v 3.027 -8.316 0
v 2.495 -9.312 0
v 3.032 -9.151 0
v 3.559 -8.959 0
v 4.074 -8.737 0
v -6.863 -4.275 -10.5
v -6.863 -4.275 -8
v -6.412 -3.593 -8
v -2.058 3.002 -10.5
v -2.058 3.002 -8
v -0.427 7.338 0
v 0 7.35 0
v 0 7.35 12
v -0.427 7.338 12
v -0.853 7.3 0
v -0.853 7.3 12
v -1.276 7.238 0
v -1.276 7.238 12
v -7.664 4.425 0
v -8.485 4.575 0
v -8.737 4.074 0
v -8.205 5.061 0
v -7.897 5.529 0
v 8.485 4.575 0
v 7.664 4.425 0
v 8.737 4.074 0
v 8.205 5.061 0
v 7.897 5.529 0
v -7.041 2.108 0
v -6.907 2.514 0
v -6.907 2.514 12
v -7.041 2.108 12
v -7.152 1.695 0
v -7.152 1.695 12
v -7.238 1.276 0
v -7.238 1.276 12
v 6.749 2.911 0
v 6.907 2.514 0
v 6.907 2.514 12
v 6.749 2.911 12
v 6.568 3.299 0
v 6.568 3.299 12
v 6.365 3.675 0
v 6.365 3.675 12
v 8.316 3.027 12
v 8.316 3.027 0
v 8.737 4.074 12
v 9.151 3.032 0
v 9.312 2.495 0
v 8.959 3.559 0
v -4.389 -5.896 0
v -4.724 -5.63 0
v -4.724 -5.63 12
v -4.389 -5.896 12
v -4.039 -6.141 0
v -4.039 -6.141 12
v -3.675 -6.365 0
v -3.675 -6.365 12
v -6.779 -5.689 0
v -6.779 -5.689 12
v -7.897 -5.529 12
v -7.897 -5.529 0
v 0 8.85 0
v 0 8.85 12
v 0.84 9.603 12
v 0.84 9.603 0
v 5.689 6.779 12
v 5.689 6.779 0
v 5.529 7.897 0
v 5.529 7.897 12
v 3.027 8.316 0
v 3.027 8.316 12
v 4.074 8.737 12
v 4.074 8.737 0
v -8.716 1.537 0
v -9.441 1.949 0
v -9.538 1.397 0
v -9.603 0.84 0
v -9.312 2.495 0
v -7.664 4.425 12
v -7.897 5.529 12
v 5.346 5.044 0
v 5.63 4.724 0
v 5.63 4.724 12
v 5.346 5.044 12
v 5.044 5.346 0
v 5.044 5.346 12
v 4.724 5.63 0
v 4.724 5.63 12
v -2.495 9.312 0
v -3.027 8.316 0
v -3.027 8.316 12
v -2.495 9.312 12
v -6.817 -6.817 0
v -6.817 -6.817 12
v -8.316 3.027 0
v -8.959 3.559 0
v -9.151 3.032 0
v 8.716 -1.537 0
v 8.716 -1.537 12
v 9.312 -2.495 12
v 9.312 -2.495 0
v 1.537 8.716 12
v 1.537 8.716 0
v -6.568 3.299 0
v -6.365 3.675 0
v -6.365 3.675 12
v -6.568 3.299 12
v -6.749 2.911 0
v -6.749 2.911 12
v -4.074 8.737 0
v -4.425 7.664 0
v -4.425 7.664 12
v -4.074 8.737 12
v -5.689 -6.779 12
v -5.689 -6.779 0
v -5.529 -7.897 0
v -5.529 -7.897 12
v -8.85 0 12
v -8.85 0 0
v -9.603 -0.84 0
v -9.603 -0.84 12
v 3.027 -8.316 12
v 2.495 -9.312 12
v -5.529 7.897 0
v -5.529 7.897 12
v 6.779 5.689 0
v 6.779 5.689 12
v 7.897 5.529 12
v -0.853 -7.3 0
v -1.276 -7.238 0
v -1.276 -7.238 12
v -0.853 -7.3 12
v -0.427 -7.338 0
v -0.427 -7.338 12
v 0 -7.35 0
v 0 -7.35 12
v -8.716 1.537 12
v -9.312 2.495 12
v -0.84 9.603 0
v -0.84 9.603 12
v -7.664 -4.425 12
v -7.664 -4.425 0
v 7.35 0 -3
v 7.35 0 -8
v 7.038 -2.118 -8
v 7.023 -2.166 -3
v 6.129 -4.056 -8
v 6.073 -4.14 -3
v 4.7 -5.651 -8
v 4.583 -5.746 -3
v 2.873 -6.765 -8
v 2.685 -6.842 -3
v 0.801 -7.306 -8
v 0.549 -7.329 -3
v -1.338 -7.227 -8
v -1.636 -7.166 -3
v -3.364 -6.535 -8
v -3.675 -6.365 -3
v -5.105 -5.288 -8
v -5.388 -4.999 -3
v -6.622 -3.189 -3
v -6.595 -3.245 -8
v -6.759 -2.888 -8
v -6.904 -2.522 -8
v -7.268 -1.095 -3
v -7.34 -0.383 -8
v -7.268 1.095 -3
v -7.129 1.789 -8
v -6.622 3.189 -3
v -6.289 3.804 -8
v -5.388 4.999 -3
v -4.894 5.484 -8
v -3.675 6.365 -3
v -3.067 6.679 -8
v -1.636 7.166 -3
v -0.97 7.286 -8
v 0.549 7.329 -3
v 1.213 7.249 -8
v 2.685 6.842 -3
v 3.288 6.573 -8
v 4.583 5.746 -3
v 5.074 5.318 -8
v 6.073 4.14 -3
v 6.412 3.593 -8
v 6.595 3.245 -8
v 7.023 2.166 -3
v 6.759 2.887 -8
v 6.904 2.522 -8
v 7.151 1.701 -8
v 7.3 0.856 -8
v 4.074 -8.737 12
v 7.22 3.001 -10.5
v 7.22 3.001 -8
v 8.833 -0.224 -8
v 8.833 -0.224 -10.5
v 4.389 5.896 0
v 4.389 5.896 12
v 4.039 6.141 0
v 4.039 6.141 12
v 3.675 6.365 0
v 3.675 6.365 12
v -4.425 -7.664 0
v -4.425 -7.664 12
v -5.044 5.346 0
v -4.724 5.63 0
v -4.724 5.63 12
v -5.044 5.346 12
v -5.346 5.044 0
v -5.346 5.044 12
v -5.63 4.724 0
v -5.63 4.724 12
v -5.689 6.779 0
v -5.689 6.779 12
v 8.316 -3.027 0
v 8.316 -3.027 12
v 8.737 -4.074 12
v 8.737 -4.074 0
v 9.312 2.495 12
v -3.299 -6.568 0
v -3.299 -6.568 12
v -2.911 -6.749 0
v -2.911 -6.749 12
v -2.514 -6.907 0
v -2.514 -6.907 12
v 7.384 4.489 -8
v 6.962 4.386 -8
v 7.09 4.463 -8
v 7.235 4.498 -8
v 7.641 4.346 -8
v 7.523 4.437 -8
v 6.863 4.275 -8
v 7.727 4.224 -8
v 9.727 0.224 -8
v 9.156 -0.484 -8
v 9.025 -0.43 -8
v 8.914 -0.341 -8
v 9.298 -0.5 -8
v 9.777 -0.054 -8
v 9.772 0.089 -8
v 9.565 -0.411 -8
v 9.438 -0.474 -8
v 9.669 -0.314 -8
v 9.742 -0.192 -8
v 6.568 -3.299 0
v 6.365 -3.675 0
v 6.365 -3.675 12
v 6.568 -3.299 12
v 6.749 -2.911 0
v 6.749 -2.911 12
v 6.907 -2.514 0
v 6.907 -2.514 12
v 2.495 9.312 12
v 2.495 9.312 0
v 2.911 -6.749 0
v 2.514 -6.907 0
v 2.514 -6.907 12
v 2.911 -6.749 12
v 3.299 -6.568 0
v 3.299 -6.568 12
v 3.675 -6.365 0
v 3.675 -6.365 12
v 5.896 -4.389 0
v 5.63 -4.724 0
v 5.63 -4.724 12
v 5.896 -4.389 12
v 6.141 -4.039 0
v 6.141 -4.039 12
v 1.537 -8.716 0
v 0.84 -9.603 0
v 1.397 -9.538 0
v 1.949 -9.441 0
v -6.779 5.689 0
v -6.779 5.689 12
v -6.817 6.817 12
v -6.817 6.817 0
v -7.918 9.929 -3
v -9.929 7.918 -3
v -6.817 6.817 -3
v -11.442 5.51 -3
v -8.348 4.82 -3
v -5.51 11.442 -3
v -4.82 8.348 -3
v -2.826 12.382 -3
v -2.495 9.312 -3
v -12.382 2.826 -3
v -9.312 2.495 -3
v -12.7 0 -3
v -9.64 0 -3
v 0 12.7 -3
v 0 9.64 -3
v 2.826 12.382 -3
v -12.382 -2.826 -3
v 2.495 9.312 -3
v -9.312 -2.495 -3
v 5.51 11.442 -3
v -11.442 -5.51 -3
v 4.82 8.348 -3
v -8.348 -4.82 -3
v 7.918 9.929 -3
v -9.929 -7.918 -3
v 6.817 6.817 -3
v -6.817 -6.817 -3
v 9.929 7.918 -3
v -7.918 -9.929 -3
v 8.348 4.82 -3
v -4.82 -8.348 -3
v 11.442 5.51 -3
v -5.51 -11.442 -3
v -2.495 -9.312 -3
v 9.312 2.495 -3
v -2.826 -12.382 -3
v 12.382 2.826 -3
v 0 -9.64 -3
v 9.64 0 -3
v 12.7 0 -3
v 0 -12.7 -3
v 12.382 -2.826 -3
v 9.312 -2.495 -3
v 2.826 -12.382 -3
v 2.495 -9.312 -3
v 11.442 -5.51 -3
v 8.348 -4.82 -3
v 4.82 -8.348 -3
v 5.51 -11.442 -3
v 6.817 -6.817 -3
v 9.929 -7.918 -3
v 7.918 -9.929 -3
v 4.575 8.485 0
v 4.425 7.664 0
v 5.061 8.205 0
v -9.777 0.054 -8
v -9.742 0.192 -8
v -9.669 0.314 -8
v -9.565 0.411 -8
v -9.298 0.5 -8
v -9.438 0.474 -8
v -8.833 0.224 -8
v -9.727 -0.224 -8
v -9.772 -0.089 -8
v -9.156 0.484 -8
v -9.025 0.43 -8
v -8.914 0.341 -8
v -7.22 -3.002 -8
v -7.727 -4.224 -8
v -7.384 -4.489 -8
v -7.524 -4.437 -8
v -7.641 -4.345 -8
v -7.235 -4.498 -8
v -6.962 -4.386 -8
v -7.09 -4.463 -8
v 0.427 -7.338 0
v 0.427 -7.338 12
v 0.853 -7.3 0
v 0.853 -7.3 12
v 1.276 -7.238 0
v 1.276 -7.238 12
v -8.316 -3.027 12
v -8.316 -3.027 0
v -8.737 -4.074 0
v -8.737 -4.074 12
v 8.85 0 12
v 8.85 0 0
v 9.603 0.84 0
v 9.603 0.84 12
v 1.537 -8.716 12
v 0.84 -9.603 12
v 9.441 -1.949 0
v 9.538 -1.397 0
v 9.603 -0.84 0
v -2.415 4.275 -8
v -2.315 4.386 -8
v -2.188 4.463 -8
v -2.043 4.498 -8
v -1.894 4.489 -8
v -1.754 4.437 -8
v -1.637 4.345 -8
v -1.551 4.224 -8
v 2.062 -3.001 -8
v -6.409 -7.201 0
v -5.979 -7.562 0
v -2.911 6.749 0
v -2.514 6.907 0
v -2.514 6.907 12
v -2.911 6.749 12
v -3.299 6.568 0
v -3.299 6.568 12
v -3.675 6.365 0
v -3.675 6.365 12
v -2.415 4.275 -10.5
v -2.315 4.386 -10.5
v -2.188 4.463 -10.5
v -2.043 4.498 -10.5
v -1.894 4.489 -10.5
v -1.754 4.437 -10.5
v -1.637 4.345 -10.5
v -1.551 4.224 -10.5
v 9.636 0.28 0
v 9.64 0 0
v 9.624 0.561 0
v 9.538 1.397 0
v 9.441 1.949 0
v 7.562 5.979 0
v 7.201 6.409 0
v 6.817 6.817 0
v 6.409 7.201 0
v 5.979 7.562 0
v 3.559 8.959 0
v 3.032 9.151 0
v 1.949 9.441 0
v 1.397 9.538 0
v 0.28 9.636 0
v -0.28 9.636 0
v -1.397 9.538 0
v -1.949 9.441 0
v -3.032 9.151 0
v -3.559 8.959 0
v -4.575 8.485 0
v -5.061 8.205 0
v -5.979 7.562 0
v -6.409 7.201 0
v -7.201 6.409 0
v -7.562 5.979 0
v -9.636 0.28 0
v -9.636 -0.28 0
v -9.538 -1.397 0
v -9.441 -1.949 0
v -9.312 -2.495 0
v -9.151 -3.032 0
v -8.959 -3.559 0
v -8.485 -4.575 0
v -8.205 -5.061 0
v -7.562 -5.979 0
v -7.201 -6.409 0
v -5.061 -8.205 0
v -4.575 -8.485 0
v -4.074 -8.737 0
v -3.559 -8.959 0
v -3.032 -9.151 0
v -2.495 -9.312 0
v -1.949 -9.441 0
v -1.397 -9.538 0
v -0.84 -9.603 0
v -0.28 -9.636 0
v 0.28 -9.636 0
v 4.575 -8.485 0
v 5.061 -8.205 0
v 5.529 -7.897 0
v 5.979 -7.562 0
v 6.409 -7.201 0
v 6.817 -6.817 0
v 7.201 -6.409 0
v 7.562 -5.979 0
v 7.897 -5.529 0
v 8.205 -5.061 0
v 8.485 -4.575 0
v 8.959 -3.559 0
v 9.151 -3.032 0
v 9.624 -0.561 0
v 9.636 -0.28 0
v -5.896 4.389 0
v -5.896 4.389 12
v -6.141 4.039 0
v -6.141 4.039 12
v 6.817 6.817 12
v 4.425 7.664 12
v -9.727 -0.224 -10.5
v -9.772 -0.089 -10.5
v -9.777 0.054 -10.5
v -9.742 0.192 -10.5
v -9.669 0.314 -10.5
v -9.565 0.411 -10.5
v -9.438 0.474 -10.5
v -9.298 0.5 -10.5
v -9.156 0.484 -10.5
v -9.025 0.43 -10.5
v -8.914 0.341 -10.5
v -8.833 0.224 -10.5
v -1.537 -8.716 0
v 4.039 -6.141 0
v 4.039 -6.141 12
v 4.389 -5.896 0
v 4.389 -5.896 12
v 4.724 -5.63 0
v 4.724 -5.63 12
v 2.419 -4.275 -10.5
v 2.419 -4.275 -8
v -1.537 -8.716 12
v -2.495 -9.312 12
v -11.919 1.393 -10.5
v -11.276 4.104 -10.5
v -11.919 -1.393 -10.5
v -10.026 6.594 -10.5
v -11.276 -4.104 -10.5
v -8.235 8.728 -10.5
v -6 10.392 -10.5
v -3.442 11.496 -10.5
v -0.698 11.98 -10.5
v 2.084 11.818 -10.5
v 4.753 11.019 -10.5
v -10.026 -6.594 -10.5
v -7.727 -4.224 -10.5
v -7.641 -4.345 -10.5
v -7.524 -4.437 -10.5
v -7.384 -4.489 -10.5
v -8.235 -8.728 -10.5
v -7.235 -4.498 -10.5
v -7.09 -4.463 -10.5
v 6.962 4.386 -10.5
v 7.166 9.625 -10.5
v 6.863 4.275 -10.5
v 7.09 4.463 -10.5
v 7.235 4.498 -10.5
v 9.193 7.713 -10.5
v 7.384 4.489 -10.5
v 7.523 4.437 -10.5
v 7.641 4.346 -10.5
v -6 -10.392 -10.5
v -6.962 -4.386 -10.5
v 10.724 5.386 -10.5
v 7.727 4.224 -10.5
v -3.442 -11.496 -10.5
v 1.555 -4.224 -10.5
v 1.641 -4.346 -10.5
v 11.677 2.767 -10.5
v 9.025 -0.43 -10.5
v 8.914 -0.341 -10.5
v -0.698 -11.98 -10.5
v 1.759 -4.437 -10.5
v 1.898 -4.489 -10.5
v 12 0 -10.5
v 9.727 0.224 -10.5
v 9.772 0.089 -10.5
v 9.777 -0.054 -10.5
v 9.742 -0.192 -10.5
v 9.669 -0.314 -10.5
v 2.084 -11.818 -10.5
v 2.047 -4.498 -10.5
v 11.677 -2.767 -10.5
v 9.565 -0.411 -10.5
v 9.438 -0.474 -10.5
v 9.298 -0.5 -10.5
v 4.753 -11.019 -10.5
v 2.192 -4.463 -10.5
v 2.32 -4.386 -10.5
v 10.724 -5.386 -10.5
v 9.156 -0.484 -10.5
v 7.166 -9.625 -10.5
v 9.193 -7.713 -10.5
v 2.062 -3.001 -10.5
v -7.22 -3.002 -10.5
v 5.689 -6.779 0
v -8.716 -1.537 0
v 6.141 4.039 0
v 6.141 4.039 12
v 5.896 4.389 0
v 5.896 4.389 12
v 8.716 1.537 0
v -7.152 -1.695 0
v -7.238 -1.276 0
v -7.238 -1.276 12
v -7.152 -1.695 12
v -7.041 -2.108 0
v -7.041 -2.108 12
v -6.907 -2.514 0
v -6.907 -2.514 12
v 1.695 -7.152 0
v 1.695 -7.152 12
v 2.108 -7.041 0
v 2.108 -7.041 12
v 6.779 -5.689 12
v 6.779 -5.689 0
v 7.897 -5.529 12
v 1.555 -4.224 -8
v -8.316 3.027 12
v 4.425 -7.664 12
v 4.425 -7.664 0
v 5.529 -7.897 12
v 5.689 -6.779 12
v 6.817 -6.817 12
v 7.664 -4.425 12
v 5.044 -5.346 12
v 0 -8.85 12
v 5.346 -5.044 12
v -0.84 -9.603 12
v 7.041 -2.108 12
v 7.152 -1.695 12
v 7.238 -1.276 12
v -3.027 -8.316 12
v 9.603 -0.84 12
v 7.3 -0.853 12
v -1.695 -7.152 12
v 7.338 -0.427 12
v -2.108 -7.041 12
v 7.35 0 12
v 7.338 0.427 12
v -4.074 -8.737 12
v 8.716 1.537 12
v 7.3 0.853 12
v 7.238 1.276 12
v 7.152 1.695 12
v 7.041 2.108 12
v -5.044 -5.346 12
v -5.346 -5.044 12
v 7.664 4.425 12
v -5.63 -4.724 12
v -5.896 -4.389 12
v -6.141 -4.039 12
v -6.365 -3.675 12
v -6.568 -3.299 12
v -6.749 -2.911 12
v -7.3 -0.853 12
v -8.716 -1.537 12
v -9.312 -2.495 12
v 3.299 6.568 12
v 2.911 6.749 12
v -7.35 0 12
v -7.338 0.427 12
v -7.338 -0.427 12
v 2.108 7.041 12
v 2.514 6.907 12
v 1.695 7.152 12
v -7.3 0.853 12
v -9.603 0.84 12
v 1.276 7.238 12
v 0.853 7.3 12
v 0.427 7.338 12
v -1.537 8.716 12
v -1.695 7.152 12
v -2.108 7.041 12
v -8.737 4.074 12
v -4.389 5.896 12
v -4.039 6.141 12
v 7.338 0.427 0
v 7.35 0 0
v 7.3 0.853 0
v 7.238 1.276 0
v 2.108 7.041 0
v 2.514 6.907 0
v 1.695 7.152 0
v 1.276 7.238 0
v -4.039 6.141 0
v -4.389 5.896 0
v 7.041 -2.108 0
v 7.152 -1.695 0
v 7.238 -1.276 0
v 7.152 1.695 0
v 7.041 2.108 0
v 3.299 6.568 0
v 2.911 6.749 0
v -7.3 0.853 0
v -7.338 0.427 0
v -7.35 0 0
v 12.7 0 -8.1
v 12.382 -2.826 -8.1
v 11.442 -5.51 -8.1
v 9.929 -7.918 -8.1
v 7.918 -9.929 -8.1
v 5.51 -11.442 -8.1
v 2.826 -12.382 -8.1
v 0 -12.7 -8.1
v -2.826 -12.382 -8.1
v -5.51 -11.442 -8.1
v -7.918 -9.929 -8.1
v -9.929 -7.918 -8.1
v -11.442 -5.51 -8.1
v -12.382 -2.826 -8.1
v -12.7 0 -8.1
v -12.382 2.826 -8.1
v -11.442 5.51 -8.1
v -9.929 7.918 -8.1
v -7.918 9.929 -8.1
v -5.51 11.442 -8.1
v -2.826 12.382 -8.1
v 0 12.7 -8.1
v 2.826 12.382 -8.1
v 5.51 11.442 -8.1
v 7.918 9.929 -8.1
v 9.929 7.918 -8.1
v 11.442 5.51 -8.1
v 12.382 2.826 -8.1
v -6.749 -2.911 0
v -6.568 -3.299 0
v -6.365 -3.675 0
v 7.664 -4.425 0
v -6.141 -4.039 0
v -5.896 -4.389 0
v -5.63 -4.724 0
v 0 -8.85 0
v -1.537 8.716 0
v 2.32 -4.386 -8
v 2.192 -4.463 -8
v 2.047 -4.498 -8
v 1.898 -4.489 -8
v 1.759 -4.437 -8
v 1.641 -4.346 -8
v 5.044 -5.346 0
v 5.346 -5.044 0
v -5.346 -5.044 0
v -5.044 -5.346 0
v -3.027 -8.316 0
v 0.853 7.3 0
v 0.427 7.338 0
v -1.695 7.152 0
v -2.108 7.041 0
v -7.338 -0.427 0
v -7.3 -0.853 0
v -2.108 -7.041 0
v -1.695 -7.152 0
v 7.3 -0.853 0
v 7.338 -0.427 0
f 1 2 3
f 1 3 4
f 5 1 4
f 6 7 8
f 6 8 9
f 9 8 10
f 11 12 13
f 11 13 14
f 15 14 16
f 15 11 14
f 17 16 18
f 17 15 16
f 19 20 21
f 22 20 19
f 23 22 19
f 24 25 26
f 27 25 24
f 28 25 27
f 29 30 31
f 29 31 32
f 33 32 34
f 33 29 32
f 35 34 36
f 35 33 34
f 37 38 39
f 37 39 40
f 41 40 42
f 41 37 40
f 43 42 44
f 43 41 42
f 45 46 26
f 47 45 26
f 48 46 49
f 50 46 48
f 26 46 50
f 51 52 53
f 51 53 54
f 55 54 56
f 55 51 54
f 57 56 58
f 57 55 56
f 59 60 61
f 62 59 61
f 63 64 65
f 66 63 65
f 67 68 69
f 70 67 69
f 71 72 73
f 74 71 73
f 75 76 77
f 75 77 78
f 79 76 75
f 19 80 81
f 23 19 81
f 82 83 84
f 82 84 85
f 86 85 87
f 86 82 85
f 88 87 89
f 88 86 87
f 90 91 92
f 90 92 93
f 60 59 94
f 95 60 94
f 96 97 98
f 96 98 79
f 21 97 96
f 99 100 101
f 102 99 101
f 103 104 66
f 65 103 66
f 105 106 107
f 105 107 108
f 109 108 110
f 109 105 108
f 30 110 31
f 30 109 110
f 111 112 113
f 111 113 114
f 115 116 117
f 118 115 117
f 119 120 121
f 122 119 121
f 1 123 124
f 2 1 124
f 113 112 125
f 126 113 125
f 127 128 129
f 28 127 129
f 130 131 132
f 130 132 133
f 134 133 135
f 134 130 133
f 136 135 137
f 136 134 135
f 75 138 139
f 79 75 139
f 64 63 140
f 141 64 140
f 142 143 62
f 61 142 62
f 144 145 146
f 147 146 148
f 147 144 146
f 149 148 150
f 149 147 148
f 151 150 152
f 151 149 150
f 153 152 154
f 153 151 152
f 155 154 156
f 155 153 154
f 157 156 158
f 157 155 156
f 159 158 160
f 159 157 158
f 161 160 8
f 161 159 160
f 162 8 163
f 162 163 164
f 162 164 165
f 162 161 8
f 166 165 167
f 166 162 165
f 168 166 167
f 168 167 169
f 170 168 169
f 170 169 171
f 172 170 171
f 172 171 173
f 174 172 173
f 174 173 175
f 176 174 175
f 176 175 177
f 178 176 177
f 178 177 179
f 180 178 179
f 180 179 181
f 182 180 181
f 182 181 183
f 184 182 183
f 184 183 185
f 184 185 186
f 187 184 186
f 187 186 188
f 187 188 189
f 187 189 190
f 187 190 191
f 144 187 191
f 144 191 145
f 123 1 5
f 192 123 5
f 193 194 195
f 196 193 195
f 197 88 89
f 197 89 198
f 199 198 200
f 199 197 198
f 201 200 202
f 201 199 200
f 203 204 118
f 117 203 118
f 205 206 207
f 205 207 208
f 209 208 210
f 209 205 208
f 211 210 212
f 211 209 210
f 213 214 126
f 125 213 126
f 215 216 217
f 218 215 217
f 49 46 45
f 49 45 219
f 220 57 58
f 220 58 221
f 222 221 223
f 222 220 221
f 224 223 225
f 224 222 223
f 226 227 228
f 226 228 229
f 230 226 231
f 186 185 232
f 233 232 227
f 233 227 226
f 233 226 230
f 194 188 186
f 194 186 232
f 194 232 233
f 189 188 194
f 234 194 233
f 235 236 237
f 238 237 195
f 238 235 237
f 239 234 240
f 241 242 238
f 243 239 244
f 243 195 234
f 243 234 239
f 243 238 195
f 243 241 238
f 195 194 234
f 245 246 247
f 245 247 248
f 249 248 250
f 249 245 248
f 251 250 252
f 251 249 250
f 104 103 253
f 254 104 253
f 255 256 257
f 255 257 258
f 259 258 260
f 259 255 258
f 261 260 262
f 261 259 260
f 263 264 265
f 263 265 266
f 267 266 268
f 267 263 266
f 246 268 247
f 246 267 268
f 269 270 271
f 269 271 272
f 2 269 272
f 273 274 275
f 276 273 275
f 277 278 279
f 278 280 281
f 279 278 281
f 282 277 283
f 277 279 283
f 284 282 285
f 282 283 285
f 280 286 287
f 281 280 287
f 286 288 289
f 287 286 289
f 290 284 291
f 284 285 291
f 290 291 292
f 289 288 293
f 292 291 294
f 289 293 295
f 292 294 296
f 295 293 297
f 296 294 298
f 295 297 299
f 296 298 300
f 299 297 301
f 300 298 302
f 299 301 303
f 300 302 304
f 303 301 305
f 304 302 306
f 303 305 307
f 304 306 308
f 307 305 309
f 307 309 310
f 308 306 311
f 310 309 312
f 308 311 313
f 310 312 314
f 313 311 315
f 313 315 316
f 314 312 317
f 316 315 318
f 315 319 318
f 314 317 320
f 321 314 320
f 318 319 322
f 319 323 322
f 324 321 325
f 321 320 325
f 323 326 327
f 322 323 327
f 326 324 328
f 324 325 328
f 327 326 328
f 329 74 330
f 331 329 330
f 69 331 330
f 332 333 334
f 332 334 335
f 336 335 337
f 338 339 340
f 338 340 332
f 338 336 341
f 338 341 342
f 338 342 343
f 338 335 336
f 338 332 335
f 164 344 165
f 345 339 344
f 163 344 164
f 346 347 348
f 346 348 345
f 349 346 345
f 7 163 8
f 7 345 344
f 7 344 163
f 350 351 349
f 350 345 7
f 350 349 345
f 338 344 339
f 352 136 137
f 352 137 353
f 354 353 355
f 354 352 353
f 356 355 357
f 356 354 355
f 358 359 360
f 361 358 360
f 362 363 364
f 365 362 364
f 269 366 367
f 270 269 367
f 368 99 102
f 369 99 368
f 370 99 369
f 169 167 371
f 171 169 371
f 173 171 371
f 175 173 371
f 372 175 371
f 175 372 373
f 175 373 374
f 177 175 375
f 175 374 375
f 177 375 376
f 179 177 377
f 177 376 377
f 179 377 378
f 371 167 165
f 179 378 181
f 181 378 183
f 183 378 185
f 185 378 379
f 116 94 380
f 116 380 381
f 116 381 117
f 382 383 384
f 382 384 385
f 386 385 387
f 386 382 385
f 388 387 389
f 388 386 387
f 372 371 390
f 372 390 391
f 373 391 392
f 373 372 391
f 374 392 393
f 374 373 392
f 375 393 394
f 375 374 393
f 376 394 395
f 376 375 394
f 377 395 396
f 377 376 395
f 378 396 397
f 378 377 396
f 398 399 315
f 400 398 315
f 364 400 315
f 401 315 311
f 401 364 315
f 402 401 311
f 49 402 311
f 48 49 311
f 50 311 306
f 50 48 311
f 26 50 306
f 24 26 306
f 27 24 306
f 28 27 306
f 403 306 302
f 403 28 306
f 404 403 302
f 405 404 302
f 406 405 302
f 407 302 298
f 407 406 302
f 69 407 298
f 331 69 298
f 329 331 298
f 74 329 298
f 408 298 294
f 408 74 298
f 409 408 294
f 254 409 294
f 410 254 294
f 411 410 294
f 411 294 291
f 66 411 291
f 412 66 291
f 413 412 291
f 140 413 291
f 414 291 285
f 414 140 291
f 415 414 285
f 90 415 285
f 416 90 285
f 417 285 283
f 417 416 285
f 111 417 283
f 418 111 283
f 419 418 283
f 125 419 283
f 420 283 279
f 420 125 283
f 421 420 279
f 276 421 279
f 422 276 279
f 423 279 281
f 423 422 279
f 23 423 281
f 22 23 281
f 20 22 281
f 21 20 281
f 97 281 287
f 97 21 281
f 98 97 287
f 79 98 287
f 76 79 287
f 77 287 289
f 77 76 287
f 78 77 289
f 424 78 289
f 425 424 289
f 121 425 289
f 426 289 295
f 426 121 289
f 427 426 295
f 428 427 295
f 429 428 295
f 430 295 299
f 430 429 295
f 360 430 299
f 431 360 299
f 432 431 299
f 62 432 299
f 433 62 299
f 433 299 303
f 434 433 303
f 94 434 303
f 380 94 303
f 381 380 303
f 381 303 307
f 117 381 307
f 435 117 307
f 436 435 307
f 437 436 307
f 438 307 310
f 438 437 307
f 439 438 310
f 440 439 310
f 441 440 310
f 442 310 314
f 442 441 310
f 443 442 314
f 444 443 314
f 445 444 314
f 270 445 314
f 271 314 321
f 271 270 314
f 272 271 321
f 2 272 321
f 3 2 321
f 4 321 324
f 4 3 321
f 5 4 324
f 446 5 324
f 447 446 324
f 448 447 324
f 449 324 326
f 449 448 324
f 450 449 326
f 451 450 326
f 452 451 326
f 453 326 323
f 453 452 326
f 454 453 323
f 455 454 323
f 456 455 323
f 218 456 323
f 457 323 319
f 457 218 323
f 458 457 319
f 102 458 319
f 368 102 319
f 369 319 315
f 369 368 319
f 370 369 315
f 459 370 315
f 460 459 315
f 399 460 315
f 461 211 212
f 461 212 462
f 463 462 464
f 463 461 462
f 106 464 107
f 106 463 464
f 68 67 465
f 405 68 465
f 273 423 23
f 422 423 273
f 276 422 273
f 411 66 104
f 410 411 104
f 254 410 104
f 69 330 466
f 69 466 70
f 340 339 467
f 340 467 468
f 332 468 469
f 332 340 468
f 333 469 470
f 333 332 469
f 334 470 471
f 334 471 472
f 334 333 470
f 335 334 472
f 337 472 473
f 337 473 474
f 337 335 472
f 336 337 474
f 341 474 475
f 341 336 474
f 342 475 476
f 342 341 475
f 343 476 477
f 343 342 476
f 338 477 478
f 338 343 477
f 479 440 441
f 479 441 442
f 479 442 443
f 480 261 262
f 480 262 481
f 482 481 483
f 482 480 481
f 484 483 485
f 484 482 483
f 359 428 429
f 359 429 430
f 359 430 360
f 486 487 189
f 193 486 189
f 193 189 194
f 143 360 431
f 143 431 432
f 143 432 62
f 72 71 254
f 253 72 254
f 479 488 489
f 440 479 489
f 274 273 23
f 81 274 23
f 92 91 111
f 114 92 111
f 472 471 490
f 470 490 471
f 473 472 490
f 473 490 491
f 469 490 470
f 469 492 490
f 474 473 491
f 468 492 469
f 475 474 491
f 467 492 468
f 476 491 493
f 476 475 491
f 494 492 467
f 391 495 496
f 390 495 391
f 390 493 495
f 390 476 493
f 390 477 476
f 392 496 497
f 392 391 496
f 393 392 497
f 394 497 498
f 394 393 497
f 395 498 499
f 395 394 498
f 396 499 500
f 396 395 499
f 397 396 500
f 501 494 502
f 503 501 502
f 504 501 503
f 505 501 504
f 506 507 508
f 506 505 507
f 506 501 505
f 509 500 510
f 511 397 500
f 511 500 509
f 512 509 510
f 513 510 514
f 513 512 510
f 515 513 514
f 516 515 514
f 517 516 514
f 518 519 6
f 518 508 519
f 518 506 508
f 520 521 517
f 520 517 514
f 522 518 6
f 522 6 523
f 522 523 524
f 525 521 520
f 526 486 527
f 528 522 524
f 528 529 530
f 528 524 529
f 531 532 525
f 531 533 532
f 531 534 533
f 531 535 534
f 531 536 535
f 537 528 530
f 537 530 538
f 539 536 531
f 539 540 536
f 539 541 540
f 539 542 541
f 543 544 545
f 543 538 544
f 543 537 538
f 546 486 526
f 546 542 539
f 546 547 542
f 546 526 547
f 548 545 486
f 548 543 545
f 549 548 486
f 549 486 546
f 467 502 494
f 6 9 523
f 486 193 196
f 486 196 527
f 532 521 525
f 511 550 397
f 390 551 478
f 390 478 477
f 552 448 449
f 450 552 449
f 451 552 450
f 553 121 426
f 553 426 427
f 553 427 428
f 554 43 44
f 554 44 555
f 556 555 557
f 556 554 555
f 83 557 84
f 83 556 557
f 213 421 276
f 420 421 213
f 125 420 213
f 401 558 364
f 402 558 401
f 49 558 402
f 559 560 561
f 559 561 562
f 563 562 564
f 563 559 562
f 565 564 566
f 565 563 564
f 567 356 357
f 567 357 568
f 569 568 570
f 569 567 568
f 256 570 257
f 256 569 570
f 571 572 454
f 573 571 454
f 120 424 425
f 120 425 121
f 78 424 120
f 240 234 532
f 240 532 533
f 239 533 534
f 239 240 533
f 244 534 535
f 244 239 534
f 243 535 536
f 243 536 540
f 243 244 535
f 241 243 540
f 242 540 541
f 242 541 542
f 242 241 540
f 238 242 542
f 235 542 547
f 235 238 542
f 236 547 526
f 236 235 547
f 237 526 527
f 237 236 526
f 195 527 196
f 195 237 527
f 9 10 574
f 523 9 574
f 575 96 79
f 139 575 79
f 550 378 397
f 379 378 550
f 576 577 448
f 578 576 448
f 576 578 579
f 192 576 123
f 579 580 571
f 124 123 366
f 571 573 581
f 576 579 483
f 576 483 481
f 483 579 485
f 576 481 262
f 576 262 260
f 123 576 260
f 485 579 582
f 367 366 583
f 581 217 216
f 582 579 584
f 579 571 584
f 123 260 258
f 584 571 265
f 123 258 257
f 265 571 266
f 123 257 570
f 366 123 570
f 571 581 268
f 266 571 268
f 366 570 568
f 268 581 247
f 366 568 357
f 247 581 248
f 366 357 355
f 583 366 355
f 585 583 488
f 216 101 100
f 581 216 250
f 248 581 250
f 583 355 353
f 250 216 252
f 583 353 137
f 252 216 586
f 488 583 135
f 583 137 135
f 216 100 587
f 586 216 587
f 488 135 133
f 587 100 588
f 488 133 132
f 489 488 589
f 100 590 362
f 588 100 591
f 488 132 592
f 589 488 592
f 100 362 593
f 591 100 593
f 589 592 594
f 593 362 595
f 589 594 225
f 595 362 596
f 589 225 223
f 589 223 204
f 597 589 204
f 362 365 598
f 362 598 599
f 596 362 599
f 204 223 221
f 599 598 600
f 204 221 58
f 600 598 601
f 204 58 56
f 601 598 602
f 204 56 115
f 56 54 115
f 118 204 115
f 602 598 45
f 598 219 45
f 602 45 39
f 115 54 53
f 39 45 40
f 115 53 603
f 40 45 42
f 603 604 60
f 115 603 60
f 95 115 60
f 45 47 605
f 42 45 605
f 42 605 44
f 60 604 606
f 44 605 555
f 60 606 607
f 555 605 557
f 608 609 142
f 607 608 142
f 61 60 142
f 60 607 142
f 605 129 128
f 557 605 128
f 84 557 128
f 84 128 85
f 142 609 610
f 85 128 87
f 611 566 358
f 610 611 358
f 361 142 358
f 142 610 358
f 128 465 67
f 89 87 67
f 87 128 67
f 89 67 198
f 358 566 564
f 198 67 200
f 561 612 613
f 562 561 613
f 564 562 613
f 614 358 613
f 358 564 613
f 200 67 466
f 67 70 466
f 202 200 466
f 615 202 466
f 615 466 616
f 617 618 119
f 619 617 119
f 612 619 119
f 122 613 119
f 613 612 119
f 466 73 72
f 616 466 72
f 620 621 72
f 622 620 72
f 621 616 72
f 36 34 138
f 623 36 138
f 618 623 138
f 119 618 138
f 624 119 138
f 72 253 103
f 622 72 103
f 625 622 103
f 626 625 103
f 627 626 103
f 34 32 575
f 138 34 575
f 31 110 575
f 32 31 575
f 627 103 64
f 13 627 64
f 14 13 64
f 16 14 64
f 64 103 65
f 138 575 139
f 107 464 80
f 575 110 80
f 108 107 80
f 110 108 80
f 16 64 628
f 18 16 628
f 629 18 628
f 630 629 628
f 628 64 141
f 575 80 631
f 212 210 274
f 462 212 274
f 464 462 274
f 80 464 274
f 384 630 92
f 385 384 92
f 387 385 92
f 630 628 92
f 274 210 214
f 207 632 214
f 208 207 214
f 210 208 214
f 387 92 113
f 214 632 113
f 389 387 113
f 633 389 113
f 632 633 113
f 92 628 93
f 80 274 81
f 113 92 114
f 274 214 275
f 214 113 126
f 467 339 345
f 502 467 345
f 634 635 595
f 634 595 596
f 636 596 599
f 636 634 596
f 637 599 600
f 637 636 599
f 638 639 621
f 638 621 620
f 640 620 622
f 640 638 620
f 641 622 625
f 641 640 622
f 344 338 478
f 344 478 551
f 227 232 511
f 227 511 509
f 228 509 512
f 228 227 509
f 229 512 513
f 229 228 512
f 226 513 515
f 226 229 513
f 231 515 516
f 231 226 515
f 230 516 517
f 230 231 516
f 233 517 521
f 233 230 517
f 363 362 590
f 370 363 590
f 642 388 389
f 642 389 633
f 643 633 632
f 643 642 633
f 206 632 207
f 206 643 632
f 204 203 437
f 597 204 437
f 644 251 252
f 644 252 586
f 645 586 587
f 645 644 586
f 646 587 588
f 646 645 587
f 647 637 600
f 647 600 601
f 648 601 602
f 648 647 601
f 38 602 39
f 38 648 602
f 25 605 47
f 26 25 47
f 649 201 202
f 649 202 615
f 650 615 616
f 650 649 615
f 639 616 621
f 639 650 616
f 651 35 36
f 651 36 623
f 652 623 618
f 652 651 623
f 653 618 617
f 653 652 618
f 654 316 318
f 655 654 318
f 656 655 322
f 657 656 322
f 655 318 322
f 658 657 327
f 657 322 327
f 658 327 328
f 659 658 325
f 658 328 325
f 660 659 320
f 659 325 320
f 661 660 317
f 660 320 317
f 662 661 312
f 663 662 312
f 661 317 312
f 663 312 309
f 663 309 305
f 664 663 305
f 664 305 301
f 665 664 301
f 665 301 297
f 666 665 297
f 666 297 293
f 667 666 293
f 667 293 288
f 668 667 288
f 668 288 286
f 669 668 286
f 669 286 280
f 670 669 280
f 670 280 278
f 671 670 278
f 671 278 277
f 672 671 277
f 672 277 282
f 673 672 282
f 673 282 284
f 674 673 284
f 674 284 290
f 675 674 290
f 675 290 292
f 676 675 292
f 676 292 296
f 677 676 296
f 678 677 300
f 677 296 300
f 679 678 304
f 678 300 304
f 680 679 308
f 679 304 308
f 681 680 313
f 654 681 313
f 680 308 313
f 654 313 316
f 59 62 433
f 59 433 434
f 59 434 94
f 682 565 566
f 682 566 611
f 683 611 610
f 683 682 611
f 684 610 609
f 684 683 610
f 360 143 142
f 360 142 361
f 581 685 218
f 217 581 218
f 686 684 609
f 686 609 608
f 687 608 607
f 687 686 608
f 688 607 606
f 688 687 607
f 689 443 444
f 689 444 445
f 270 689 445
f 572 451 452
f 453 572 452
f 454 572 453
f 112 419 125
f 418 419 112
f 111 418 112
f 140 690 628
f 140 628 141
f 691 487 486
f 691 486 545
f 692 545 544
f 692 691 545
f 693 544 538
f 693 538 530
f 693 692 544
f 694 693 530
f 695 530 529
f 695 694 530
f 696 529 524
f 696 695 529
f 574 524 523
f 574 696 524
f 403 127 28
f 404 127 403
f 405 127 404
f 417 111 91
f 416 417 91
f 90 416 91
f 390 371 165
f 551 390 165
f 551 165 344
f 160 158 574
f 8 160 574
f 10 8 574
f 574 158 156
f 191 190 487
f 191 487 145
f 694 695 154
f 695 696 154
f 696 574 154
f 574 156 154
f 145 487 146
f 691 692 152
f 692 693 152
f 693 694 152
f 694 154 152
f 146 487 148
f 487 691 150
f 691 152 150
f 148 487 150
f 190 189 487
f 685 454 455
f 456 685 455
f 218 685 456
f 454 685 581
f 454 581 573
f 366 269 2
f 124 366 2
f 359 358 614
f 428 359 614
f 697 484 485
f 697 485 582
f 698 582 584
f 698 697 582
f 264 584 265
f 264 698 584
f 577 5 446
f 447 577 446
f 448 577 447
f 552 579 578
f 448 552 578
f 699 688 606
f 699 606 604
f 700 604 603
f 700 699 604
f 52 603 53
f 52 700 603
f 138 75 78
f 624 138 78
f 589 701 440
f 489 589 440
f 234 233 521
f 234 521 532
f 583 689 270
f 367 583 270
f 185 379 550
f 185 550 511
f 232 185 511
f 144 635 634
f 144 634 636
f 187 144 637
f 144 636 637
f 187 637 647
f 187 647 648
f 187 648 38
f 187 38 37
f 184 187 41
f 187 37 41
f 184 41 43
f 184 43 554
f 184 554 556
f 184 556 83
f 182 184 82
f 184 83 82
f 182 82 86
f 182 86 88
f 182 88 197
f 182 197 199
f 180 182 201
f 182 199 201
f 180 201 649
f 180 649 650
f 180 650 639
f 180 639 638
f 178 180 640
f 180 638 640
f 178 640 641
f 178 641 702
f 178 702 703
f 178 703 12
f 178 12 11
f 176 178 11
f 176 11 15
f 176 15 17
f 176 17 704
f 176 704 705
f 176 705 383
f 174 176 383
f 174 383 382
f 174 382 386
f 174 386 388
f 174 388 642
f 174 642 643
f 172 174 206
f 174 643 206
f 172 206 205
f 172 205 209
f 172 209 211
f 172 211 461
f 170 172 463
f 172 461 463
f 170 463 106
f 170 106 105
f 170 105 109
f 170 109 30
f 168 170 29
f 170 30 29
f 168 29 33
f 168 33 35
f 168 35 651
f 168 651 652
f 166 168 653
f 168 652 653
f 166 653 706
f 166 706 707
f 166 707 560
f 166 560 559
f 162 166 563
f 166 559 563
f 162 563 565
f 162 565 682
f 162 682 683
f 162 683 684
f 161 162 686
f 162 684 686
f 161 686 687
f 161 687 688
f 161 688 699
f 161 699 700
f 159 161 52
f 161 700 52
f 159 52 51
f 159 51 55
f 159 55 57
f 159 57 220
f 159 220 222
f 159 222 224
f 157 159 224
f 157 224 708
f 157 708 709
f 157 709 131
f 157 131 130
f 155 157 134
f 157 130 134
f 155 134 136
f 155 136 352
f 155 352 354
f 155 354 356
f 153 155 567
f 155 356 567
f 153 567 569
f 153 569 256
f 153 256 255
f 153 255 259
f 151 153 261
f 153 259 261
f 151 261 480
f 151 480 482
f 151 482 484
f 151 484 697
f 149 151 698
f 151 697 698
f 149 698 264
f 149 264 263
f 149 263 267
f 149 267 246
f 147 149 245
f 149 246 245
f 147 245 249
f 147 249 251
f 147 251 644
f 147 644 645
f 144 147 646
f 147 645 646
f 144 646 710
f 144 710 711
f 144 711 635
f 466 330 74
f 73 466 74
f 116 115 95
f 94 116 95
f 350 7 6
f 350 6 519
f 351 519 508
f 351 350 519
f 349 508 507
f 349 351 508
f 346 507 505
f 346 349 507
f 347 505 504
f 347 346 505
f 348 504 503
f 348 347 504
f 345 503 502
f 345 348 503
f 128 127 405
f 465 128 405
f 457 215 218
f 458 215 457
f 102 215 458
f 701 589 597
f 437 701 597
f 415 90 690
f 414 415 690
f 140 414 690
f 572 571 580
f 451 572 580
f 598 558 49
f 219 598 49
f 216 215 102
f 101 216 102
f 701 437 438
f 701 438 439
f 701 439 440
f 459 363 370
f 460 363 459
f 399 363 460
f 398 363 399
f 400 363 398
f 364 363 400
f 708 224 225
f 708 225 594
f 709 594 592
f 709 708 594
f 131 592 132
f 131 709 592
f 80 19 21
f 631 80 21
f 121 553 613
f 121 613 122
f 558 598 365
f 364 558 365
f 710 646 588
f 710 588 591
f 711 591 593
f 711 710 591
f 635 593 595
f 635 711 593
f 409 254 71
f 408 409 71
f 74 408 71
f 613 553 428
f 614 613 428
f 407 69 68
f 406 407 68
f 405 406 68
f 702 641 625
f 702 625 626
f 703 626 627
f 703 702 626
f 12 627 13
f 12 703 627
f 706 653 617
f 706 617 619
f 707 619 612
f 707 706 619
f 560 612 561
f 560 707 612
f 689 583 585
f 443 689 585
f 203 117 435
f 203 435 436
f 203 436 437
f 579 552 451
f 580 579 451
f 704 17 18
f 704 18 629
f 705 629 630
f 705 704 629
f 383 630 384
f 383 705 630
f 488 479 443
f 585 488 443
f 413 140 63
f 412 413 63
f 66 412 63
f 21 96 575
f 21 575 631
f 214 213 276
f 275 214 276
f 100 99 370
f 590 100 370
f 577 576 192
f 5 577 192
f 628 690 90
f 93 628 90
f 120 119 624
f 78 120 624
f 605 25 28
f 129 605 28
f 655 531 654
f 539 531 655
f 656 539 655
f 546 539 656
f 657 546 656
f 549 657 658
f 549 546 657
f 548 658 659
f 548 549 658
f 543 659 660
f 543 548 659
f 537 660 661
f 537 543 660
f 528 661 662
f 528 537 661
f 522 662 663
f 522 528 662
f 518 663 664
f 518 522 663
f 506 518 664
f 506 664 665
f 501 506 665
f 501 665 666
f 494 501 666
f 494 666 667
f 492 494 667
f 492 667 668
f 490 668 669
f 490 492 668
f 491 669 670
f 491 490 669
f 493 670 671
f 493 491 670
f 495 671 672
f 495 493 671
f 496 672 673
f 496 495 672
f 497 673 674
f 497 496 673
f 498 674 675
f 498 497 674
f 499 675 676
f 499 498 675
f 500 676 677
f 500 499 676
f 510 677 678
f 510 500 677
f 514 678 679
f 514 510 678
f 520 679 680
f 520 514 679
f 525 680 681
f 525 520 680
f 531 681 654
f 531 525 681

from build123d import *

# Parameters (mm, degrees)
PAD_DEPTH          = 12
POLARPATTERN_COUNT = 36
SKETCH001_R        = 9.64
SKETCH001_R_2      = 7.35
PAD001_DEPTH       = 3
SKETCH002_R        = 12.7
SKETCH002_R_2      = 7.35
PAD002_DEPTH       = 5
SKETCH003_R        = 12.7
PAD003_DEPTH       = 2.5
CHAMFER_SIZE2      = 0.7
CHAMFER_SIZE       = 2.4


with BuildPart() as part:
    # Sketch → Pad (new body)
    with BuildSketch(Plane.XY):
        with BuildLine():
            Line((0, 8.85), (0.8401813601, 9.6033168896))
            Line((1.5367863724, 8.7155486142), (0.8401813601, 9.6033168896))
            Line((1.2763141059, 7.2383369846), (1.5367863724, 8.7155486142))
            ThreePointArc((1.2763141059, 7.2383369846), (0.6405947092, 7.322031031), (0, 7.35))
            Line((0, 7.35), (0, 8.85))
        make_face()
    pad = extrude(amount=PAD_DEPTH)

    # PolarPattern: Pad ×36 about axis
    polarpattern_axis = Axis((0, 0, 0), (0, 0, 1))
    for i in range(1, POLARPATTERN_COUNT):
        add(pad.rotate(polarpattern_axis, i * 360 / POLARPATTERN_COUNT))

    # Sketch001 (on DatumPlane) → Pad001 (join)
    with BuildSketch(Plane.XY):
        Circle(SKETCH001_R)
        Circle(SKETCH001_R_2, mode=Mode.SUBTRACT)
    extrude(amount=-PAD001_DEPTH)

    # Sketch002 (on Face51 of Pad001) → Pad002 (join)
    with BuildSketch(Plane(origin=(0, 0, -3), x_dir=(1, 0, 0), z_dir=(0, 0, -1))):
        Circle(SKETCH002_R)
        Circle(SKETCH002_R_2, mode=Mode.SUBTRACT)
    extrude(amount=PAD002_DEPTH)

    # Sketch003 (on DatumPlane) → Pad003 (join)
    with BuildSketch(Plane(origin=(0, 0, -8), x_dir=(1, 0, 0), z_dir=(0, 0, -1))):
        Circle(SKETCH003_R)
        with BuildLine():
            ThreePointArc((-9.7272135955, 0.2236067977), (-9.5036067977, -0.4472135955), (-8.8327864045, -0.2236067977))
            Line((-8.8327864045, -0.2236067977), (-7.2200847391, 3.001796533))
            Line((-2.4152236623, -4.2754949357), (-7.2200847391, 3.001796533))
            ThreePointArc((-2.4152236623, -4.2754949357), (-1.9680100668, -4.4991017335), (-1.5507541017, -4.2236067977))
            Line((-1.5507541017, -4.2236067977), (2.061789241, 3.0014798877))
            Line((2.061789241, 3.0014798877), (6.8626465602, -4.2753472467))
            ThreePointArc((6.8626465602, -4.2753472467), (7.309869311, -4.4991070269), (7.7272135955, -4.2236067977))
            Line((7.7272135955, -4.2236067977), (9.7272135955, -0.2236067977))
            ThreePointArc((9.7272135955, -0.2236067977), (9.5036067977, 0.4472135955), (8.8327864045, 0.2236067977))
            Line((7.2202430618, -3.0014798877), (8.8327864045, 0.2236067977))
            Line((2.4193857426, 4.2753472467), (7.2202430618, -3.0014798877))
            ThreePointArc((2.4193857426, 4.2753472467), (1.9721629918, 4.4991070269), (1.5548187073, 4.2236067977))
            Line((-2.0578829581, -3.001796533), (1.5548187073, 4.2236067977))
            Line((-6.8627440349, 4.2754949357), (-2.0578829581, -3.001796533))
            ThreePointArc((-6.8627440349, 4.2754949357), (-7.3099576304, 4.4991017335), (-7.7272135955, 4.2236067977))
            Line((-9.7272135955, 0.2236067977), (-7.7272135955, 4.2236067977))
        make_face(mode=Mode.SUBTRACT)
    extrude(amount=PAD003_DEPTH)

    # Chamfer
    chamfer_edges = [part.edges().sort_by_distance(p)[0] for p in [
        (-12.7, 0, -10.5),
    ]]
    chamfer_side = part.faces().sort_by_distance((-12.7, 0, -9.25))[0]
    chamfer(chamfer_edges, length=CHAMFER_SIZE, length2=CHAMFER_SIZE2, reference=chamfer_side)


solid = part.part
